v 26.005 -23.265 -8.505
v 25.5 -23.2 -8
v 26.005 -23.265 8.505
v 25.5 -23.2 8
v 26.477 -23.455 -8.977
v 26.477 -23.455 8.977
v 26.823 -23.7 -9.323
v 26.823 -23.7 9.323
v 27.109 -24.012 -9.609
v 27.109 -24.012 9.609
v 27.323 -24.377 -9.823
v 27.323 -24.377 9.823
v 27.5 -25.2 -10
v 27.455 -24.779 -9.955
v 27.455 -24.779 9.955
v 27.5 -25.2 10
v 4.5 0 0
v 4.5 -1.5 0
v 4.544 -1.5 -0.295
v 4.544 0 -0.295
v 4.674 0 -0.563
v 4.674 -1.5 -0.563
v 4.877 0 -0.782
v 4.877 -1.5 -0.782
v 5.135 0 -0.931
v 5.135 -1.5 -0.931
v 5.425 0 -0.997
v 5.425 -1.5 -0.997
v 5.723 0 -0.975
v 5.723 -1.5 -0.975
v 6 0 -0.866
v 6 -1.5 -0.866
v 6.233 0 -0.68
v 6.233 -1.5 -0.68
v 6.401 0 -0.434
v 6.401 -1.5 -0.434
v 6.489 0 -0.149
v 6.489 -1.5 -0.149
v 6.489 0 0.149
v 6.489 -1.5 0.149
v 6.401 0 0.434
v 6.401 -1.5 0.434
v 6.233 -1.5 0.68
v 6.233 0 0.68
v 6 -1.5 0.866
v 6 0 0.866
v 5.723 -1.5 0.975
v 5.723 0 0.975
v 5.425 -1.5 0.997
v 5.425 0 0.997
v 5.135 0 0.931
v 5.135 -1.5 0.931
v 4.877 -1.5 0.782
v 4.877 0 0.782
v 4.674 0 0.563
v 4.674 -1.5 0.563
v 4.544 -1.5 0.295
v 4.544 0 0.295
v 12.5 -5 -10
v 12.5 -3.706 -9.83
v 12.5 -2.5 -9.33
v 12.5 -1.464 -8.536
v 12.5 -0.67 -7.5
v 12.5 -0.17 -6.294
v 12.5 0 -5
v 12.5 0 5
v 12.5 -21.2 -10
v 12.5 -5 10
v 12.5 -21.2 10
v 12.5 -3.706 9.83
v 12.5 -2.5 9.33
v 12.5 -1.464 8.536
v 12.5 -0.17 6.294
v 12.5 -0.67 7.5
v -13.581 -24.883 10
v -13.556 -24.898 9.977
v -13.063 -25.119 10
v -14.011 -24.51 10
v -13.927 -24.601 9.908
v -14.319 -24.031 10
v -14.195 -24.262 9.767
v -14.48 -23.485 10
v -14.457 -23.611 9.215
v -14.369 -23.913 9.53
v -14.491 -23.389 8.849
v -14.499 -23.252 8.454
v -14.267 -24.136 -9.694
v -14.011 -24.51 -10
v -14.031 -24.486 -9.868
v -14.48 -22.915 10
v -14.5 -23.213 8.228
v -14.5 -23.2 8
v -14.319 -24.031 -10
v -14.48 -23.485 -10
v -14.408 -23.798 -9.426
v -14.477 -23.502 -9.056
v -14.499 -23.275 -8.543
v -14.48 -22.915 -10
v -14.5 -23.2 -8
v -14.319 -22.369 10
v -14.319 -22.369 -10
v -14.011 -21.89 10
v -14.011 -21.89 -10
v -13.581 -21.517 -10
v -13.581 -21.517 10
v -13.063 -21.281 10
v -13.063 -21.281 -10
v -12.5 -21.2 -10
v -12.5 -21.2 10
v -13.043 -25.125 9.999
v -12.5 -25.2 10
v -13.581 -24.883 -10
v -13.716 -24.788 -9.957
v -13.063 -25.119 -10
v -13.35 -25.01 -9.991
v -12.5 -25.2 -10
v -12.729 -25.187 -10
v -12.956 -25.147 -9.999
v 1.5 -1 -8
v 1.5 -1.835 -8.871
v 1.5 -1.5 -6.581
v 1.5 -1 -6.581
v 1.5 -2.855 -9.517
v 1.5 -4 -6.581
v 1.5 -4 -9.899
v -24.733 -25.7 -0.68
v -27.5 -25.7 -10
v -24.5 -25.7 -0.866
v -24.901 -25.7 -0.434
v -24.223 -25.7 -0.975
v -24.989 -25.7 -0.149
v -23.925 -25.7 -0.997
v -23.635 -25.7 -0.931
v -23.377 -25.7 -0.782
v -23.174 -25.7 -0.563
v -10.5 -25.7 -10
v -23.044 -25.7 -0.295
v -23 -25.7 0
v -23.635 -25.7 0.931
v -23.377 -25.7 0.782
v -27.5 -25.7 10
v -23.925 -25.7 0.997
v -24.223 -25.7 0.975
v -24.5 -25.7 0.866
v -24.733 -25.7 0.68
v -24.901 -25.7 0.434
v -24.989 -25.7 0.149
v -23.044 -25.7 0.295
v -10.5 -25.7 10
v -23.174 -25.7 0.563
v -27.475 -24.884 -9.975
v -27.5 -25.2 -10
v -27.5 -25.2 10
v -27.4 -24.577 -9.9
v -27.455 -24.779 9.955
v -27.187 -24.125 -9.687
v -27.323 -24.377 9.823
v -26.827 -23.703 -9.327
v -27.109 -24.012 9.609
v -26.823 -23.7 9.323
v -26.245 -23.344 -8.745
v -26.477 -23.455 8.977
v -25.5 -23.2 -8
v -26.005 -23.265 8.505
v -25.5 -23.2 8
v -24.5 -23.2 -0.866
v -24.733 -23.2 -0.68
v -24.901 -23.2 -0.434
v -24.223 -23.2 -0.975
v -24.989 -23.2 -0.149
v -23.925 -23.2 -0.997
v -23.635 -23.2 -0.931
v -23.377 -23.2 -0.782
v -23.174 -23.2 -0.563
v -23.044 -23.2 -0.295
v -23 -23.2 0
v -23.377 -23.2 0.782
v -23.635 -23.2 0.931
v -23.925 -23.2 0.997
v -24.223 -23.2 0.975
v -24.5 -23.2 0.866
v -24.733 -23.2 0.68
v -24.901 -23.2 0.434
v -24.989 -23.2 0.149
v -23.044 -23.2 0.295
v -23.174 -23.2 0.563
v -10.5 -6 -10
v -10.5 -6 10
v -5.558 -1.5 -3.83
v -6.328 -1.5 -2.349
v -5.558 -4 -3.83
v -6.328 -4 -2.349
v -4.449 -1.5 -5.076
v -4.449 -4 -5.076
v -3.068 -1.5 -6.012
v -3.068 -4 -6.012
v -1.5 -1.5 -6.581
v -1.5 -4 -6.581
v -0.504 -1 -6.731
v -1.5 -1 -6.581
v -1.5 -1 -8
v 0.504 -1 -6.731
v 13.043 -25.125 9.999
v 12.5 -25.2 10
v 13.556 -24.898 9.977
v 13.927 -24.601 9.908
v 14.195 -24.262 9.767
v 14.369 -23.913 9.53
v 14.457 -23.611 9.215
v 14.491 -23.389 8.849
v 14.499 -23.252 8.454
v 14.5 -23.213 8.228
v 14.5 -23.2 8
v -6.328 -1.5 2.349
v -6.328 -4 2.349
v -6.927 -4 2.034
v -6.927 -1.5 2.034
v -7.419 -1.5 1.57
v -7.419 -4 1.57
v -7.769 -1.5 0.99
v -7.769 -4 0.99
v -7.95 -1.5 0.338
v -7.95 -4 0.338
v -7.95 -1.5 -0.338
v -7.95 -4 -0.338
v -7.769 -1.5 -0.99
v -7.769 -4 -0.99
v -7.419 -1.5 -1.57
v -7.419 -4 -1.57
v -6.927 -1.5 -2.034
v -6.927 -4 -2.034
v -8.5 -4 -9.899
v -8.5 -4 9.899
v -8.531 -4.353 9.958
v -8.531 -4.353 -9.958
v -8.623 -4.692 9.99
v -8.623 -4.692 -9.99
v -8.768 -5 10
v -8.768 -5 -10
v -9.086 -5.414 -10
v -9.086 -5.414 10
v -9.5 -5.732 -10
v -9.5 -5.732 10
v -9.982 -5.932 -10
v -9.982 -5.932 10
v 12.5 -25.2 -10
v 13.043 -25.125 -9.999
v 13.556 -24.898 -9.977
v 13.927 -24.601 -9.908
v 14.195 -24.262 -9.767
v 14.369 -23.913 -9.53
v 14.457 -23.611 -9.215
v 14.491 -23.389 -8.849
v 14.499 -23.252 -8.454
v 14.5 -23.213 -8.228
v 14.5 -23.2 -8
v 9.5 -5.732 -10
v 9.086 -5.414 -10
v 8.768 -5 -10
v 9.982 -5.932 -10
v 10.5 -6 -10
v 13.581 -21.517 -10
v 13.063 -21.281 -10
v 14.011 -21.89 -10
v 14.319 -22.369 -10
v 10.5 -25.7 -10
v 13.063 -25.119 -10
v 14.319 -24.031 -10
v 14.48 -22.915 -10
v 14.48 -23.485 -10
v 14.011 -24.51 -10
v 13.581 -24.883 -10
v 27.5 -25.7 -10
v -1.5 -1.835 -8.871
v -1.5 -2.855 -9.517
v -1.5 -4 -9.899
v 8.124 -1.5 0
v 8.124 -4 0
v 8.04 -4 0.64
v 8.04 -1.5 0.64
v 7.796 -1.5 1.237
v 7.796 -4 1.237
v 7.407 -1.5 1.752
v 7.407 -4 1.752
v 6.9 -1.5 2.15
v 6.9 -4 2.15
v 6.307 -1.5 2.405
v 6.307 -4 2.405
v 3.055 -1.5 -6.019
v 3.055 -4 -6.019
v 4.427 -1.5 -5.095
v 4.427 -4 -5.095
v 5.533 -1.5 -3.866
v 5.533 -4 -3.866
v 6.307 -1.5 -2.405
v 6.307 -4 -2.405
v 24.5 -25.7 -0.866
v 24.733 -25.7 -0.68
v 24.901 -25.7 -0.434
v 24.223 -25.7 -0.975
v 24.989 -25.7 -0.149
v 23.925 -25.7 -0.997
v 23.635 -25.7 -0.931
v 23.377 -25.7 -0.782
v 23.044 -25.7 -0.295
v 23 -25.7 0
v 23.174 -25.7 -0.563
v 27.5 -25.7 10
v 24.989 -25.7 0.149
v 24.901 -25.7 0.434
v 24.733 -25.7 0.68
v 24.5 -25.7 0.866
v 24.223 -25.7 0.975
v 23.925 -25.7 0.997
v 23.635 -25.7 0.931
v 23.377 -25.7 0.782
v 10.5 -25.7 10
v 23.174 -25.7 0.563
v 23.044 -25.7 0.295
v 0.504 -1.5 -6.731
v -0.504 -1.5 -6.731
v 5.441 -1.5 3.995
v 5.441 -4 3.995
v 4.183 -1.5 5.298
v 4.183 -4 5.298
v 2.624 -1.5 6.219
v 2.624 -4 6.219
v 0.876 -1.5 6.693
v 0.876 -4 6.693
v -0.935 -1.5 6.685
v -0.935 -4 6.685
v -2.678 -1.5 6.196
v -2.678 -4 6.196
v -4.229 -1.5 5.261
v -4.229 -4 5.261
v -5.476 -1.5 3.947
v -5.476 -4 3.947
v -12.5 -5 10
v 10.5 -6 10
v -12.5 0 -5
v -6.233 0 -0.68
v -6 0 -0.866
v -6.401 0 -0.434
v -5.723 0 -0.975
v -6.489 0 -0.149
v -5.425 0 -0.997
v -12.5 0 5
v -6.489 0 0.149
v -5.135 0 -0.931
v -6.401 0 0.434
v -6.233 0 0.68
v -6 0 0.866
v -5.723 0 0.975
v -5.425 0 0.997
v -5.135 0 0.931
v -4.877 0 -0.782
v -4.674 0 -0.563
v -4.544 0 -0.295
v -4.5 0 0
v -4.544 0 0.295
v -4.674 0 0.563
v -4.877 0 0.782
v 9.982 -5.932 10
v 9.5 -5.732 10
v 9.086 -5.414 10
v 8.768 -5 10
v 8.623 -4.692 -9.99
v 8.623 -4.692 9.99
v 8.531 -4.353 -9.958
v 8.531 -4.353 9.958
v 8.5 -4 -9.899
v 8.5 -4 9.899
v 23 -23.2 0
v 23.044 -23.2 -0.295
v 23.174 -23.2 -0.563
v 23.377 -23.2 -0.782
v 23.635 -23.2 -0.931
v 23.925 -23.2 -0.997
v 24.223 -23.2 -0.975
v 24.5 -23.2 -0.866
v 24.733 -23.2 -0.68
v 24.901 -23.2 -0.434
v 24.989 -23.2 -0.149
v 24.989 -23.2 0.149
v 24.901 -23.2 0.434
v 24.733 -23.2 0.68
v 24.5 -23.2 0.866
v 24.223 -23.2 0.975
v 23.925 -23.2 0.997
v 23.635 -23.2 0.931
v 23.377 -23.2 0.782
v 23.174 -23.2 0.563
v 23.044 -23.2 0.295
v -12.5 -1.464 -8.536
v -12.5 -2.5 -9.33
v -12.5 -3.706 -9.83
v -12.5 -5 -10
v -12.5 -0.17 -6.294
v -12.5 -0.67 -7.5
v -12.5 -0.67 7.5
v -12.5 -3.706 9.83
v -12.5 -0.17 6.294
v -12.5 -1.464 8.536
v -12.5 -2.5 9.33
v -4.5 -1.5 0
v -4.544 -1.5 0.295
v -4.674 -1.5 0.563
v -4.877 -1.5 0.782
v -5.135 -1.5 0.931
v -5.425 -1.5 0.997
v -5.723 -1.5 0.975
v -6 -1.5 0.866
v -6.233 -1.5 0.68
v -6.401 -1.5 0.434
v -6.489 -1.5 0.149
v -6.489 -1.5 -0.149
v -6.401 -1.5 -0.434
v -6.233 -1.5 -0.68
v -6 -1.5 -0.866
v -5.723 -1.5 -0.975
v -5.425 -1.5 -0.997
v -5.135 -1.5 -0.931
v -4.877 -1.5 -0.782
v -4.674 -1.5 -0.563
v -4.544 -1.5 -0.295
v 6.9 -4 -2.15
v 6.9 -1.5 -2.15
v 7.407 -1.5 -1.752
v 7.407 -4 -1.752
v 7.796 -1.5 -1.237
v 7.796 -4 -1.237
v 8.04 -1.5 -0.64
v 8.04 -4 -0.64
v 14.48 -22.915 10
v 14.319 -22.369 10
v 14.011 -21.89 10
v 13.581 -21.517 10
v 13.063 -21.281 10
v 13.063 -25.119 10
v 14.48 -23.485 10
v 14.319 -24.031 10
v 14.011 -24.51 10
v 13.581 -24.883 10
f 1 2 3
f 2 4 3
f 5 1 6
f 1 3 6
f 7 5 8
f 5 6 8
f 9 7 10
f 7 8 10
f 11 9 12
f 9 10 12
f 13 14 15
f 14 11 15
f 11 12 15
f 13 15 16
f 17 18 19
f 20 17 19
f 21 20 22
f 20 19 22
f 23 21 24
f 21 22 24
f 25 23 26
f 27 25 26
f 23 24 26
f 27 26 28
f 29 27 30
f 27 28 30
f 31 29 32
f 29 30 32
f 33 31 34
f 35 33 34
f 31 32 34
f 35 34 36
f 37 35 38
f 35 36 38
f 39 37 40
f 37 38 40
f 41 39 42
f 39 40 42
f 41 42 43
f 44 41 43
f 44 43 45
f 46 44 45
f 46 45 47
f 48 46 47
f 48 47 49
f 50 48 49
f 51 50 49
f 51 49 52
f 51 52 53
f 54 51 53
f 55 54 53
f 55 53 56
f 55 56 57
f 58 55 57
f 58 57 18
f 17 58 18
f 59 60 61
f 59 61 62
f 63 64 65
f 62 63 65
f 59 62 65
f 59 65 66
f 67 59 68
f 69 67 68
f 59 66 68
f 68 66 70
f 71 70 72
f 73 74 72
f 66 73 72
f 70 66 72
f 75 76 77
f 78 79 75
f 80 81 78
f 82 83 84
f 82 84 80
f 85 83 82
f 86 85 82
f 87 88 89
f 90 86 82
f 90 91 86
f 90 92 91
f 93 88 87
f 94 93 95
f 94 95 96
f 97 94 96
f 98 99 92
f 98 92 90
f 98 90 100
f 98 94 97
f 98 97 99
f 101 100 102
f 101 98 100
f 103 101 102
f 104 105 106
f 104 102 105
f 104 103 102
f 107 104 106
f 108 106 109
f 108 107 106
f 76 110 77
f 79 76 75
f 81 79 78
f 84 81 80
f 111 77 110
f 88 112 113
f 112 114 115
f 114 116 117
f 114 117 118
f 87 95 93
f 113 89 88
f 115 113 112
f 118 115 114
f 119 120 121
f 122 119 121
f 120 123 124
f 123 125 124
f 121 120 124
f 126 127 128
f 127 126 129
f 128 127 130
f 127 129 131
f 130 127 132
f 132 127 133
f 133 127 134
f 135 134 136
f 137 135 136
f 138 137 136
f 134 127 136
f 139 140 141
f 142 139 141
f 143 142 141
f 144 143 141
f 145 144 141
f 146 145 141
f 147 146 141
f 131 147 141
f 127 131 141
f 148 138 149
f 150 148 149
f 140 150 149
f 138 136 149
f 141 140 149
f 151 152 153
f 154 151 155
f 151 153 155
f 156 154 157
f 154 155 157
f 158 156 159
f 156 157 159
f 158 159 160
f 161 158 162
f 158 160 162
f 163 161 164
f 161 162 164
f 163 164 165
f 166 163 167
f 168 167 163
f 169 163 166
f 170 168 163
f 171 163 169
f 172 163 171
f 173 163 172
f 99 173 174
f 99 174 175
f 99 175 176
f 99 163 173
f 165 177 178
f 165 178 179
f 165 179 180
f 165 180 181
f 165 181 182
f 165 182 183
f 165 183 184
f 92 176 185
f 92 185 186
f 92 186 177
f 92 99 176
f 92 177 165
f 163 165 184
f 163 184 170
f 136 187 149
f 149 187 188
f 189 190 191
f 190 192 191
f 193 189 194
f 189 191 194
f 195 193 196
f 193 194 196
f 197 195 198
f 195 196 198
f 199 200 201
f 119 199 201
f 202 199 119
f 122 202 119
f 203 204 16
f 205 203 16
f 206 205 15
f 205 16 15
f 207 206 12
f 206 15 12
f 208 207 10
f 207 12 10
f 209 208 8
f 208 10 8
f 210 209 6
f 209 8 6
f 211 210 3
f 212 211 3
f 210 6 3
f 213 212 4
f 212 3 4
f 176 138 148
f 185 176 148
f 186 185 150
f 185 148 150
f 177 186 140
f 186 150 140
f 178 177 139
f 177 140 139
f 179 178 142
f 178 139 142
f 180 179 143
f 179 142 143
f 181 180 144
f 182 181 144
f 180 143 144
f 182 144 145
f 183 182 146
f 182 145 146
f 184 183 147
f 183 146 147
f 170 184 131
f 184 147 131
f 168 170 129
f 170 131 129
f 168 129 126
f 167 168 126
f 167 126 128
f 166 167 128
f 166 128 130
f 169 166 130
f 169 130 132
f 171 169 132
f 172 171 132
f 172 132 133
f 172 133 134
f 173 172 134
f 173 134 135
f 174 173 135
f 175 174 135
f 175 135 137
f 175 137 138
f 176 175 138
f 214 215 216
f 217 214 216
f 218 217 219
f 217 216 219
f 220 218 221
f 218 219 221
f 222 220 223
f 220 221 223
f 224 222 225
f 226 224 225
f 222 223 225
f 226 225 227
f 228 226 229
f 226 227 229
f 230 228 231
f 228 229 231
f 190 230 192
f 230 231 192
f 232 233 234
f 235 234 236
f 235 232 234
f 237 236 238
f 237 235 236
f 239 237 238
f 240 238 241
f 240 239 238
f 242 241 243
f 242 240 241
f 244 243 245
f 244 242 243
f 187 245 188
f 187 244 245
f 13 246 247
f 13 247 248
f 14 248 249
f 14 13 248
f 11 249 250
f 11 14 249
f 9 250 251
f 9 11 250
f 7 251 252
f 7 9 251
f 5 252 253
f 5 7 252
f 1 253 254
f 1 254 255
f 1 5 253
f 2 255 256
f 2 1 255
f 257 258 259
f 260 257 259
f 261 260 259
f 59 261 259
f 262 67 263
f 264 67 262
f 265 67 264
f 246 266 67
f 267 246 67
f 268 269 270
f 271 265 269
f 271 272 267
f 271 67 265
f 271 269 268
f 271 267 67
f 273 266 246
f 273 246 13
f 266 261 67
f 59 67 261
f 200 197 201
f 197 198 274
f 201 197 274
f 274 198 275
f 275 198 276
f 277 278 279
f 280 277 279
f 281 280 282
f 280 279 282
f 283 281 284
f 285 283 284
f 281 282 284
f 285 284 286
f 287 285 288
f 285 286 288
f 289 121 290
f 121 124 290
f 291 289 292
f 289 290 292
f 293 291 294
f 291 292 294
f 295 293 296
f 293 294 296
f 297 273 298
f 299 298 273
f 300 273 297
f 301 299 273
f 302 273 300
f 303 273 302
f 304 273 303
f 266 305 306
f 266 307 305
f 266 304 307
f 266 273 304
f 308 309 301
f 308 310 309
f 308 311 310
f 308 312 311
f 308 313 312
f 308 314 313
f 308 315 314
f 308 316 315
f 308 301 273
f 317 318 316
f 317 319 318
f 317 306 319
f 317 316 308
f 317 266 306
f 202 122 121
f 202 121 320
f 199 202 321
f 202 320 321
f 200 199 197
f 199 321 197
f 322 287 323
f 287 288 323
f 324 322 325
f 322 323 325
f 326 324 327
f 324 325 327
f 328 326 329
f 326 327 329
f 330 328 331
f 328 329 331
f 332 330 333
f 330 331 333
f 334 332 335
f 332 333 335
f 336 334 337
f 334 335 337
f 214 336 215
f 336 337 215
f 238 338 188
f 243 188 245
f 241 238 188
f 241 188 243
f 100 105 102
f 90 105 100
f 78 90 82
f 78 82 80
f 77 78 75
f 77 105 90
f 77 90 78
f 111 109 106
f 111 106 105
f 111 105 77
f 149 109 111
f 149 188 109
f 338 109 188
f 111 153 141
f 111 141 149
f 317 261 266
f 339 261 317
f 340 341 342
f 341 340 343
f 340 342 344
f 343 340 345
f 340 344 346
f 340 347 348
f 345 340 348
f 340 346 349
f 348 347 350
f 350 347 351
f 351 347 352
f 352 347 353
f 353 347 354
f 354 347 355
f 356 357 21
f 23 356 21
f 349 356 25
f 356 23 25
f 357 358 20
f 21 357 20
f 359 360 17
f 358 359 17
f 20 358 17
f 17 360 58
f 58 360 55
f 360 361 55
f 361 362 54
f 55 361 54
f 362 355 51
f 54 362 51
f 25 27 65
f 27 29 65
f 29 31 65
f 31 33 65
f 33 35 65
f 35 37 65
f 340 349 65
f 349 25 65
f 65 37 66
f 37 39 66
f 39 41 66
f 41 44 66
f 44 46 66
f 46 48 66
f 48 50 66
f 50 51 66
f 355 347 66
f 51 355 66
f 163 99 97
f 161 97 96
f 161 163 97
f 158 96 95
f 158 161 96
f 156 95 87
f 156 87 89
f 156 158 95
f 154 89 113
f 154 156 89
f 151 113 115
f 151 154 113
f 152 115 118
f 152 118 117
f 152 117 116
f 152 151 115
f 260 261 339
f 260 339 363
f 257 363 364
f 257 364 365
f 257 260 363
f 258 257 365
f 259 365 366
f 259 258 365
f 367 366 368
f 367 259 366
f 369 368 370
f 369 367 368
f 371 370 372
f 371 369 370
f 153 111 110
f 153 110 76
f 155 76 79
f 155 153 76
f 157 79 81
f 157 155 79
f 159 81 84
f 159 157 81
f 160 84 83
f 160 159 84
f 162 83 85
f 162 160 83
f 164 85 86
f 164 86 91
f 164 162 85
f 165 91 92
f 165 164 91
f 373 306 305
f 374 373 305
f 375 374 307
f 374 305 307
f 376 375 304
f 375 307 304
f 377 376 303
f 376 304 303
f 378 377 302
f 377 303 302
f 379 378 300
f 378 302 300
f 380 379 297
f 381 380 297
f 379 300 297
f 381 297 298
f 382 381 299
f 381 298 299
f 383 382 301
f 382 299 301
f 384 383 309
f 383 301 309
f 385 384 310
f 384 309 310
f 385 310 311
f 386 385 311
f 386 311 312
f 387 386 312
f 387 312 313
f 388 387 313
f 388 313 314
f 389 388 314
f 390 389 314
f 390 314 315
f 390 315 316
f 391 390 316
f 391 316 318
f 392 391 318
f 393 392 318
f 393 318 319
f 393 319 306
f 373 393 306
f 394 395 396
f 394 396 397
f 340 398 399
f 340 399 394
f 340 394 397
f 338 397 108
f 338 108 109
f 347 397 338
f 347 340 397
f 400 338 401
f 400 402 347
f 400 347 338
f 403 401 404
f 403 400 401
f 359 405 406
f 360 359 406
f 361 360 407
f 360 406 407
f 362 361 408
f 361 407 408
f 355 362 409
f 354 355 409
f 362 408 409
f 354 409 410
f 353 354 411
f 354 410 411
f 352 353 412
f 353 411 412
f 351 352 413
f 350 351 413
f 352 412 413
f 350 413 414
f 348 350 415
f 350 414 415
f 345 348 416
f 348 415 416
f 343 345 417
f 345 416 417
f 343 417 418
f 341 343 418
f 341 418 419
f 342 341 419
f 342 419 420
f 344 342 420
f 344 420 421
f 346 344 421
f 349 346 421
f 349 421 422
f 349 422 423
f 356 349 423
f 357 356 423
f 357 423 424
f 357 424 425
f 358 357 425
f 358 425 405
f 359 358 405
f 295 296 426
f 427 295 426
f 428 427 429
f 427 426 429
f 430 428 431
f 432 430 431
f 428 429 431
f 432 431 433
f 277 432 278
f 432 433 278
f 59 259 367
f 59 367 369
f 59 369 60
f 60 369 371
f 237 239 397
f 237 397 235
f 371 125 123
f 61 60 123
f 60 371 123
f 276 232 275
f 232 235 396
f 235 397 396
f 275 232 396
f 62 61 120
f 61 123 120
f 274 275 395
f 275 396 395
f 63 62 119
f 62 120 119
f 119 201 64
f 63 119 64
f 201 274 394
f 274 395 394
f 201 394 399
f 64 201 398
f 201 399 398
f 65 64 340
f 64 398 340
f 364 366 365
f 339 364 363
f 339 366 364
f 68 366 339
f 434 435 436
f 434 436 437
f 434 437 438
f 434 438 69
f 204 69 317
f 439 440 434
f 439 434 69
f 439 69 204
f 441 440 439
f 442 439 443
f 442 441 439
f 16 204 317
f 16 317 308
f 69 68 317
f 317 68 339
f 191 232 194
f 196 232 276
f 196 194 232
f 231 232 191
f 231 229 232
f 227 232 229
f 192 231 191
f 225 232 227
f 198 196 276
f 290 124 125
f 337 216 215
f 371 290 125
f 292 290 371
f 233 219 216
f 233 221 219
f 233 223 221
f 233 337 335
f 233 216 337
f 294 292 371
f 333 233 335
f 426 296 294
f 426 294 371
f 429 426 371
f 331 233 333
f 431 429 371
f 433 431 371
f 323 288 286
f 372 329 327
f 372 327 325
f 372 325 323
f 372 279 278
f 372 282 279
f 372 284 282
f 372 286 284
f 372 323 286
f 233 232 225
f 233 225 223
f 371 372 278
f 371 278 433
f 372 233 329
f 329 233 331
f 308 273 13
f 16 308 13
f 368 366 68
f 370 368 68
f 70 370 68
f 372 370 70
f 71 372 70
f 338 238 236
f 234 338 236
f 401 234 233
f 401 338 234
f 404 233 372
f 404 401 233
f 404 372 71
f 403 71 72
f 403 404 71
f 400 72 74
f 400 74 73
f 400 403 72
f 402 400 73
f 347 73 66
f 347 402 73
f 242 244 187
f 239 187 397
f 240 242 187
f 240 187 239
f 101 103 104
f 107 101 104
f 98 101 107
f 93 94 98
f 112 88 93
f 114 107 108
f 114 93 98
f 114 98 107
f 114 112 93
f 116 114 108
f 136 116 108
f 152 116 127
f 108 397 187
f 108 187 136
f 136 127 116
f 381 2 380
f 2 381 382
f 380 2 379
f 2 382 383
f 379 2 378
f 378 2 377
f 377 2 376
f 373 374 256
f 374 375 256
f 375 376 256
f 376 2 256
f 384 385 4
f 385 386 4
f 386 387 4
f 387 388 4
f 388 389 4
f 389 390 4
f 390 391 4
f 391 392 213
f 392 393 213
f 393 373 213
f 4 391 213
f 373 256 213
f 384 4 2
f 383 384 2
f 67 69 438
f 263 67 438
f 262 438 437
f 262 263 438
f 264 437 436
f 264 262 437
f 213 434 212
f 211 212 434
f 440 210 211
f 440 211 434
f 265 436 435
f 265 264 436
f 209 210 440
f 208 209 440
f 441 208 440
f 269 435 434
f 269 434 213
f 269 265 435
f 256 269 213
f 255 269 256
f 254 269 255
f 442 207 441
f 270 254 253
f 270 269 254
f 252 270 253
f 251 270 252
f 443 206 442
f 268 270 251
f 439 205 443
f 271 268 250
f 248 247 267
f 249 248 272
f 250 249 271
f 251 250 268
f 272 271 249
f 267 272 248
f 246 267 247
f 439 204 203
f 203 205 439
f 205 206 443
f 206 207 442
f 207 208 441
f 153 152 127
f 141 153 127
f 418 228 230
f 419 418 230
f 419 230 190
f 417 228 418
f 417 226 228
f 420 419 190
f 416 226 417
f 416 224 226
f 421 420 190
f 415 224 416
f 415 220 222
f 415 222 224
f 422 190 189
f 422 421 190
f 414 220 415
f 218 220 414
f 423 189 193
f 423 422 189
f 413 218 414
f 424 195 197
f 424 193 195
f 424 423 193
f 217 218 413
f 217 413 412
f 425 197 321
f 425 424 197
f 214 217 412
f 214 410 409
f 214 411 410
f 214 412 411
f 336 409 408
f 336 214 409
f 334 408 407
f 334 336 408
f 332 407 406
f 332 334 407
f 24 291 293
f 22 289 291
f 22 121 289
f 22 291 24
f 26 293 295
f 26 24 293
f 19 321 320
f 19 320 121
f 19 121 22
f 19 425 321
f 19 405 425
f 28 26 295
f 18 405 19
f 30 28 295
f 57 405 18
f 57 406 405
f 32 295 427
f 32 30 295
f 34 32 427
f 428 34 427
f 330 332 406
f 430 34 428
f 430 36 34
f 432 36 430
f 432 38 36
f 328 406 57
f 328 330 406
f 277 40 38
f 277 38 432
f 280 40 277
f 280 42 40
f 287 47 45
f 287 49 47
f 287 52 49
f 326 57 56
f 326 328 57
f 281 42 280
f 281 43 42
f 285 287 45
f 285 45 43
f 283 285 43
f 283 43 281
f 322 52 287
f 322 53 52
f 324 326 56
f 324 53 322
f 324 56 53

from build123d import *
from build123d import SkipClean  # not in build123d's __all__

# Parameters (mm, degrees)
F0_W         = 25
F0_H         = 20
F1_DEPTH     = 4
F2_R         = 6.75
F3_DEPTH     = 2.5
F5_DEPTH     = 3
F6_R         = 1
F7_DEPTH     = 25
F9_DEPTH     = 2.5
F10_W        = 2
F10_H        = 20
F11_DEPTH    = 21.7
F12_W        = 2.5
F12_H        = 20
F13_DEPTH    = 15
F14_W        = 2.5
F14_H        = 20
F15_DEPTH    = 15
F16_R        = 2
F17_DEPTH    = 20
F18_T1_DEPTH = 50
F19_R        = 2
F20_R        = 1
F21_DEPTH    = 25


# Not quite as in the source:
# - a fillet or chamfer that OpenCascade refuses, or shapes differently, is made with other operations: its cross-section is extruded or revolved along the edge and cut away or added


with BuildPart() as f1:
    # F0 (on Front) → F1 (new body)
    with BuildSketch(Plane.XZ):
        Rectangle(F0_W, F0_H)
    extrude(amount=F1_DEPTH)

    # F2 (on face) → F3 (cut)
    with BuildSketch(Plane.XZ.offset(4)):
        Circle(F2_R)
    extrude(amount=-F3_DEPTH, mode=Mode.SUBTRACT)

    # F4 (on face) → F5 (cut)
    with BuildSketch(Plane.XZ.offset(4)):
        with BuildLine():
            Line((-1.5, -10), (1.5, -10))
            Line((1.5, -10), (1.5, -6.5812232905))
            ThreePointArc((1.5, -6.5812232905), (0, -6.75), (-1.5, -6.5812232905))
            Line((-1.5, -6.5812232905), (-1.5, -10))
        make_face()
    extrude(amount=-F5_DEPTH, mode=Mode.SUBTRACT)

    # F6 (on face) → F7 (cut)
    with BuildSketch(Plane.XZ.offset(1.5)):
        with Locations((-5.5, 0)):
            Circle(F6_R)
        with BuildLine():
            ThreePointArc((6.5, 0), (5.5, 1), (4.5, 0))
            ThreePointArc((4.5, 0), (5.5, -1), (6.5, 0))
        make_face()
    extrude(amount=-F7_DEPTH, mode=Mode.SUBTRACT)

    # F8 (on face) → F9 (cut)
    with BuildSketch(Plane.XZ.offset(4)):
        with BuildLine():
            ThreePointArc((-6.3279938101, -2.3492539963), (-6.75, 0), (-6.3279938101, 2.3492539963))
            ThreePointArc((-6.3279938101, 2.3492539963), (-7.9730051197, 0), (-6.3279938101, -2.3492539963))
        make_face()
        with BuildLine():
            ThreePointArc((6.3071160898, -2.4047425289), (6.75, 0), (6.3071160898, 2.4047425289))
            ThreePointArc((6.3071160898, 2.4047425289), (3.1235860102, 0), (6.3071160898, -2.4047425289))
        make_face()
        with BuildLine():
            ThreePointArc((8.1235860102, 0), (7.6184325204, 1.5068468404), (6.3071160898, 2.4047425289))
            ThreePointArc((6.3071160898, 2.4047425289), (6.75, 0), (6.3071160898, -2.4047425289))
            ThreePointArc((6.3071160898, -2.4047425289), (7.6184325204, -1.5068468404), (8.1235860102, 0))
        make_face()
    extrude(amount=-F9_DEPTH, mode=Mode.SUBTRACT)

    # F10 (on face) → F11 (join)
    with BuildSketch(Plane.XZ.offset(4)):
        with Locations((-11.5, 0)):
            Rectangle(F10_W, F10_H)
        with Locations((11.5, 0)):
            Rectangle(F10_W, F10_H)
    extrude(amount=F11_DEPTH)

    # F12 (on face) → F13 (join)
    with BuildSketch(Plane.YZ.offset(12.5)):
        with Locations((-24.45, 0)):
            Rectangle(F12_W, F12_H)
    extrude(amount=F13_DEPTH)

    # F14 (on face) → F15 (join)
    with BuildSketch(Plane(origin=(-12.5, 0, 0), x_dir=(0, -1, 0), z_dir=(-1, 0, 0))):
        with Locations((24.45, 0)):
            Rectangle(F14_W, F14_H)
    extrude(amount=F15_DEPTH)

    # F16 (on face) → F17 (join)
    with BuildSketch(Plane(origin=(0, 0, -10), x_dir=(1, 0, 0), z_dir=(0, 0, -1))):
        with Locations((-12.5, 23.2)):
            Circle(F16_R)
        with Locations((12.5, 23.2)):
            Circle(F16_R)
        with Locations((-10.5, 4)):
            Circle(F16_R)
        with Locations((10.5, 4)):
            Circle(F16_R)
    extrude(amount=-F17_DEPTH)

    # F18: fillet of radius 5 on 2 edges, made by hand

    # F18_s2 → F18_t1 (cut)
    with BuildSketch(Plane.YZ.offset(-25)):
        with BuildLine():
            ThreePointArc((-5, 10), (-1.4644660941, 8.5355339059), (0, 5))
            Line((0, 5), (0, 10))
            Line((0, 10), (-5, 10))
        make_face()
        with BuildLine():
            ThreePointArc((-5, -10), (-1.4644660941, -8.5355339059), (0, -5))
            Line((0, -5), (0, -10))
            Line((0, -10), (-5, -10))
        make_face()
    extrude(amount=F18_T1_DEPTH, mode=Mode.SUBTRACT)

    # F19
    f19_edges = [f1.edges().sort_by_distance(p)[0] for p in [
        (21, -23.2, -10),
        (21, -23.2, 10),
        (-21, -23.2, -10),
        (-21, -23.2, 10),
        (27.5, -23.2, 0),
        (-27.5, -23.2, 0),
    ]]
    fillet(f19_edges, radius=F19_R)

    # F20 (on face) → F21 (cut)
    with BuildSketch(Plane.XZ.offset(25.7)):
        with Locations((-24, 0)):
            Circle(F20_R)
        with BuildLine():
            ThreePointArc((25, 0), (24, 1), (23, 0))
            ThreePointArc((23, 0), (24, -1), (25, 0))
        make_face()
    with SkipClean():  # cleaning this boolean's faces spoils the solid; the shape is the same uncleaned
        extrude(amount=-F21_DEPTH, mode=Mode.SUBTRACT)


solid = f1.part
